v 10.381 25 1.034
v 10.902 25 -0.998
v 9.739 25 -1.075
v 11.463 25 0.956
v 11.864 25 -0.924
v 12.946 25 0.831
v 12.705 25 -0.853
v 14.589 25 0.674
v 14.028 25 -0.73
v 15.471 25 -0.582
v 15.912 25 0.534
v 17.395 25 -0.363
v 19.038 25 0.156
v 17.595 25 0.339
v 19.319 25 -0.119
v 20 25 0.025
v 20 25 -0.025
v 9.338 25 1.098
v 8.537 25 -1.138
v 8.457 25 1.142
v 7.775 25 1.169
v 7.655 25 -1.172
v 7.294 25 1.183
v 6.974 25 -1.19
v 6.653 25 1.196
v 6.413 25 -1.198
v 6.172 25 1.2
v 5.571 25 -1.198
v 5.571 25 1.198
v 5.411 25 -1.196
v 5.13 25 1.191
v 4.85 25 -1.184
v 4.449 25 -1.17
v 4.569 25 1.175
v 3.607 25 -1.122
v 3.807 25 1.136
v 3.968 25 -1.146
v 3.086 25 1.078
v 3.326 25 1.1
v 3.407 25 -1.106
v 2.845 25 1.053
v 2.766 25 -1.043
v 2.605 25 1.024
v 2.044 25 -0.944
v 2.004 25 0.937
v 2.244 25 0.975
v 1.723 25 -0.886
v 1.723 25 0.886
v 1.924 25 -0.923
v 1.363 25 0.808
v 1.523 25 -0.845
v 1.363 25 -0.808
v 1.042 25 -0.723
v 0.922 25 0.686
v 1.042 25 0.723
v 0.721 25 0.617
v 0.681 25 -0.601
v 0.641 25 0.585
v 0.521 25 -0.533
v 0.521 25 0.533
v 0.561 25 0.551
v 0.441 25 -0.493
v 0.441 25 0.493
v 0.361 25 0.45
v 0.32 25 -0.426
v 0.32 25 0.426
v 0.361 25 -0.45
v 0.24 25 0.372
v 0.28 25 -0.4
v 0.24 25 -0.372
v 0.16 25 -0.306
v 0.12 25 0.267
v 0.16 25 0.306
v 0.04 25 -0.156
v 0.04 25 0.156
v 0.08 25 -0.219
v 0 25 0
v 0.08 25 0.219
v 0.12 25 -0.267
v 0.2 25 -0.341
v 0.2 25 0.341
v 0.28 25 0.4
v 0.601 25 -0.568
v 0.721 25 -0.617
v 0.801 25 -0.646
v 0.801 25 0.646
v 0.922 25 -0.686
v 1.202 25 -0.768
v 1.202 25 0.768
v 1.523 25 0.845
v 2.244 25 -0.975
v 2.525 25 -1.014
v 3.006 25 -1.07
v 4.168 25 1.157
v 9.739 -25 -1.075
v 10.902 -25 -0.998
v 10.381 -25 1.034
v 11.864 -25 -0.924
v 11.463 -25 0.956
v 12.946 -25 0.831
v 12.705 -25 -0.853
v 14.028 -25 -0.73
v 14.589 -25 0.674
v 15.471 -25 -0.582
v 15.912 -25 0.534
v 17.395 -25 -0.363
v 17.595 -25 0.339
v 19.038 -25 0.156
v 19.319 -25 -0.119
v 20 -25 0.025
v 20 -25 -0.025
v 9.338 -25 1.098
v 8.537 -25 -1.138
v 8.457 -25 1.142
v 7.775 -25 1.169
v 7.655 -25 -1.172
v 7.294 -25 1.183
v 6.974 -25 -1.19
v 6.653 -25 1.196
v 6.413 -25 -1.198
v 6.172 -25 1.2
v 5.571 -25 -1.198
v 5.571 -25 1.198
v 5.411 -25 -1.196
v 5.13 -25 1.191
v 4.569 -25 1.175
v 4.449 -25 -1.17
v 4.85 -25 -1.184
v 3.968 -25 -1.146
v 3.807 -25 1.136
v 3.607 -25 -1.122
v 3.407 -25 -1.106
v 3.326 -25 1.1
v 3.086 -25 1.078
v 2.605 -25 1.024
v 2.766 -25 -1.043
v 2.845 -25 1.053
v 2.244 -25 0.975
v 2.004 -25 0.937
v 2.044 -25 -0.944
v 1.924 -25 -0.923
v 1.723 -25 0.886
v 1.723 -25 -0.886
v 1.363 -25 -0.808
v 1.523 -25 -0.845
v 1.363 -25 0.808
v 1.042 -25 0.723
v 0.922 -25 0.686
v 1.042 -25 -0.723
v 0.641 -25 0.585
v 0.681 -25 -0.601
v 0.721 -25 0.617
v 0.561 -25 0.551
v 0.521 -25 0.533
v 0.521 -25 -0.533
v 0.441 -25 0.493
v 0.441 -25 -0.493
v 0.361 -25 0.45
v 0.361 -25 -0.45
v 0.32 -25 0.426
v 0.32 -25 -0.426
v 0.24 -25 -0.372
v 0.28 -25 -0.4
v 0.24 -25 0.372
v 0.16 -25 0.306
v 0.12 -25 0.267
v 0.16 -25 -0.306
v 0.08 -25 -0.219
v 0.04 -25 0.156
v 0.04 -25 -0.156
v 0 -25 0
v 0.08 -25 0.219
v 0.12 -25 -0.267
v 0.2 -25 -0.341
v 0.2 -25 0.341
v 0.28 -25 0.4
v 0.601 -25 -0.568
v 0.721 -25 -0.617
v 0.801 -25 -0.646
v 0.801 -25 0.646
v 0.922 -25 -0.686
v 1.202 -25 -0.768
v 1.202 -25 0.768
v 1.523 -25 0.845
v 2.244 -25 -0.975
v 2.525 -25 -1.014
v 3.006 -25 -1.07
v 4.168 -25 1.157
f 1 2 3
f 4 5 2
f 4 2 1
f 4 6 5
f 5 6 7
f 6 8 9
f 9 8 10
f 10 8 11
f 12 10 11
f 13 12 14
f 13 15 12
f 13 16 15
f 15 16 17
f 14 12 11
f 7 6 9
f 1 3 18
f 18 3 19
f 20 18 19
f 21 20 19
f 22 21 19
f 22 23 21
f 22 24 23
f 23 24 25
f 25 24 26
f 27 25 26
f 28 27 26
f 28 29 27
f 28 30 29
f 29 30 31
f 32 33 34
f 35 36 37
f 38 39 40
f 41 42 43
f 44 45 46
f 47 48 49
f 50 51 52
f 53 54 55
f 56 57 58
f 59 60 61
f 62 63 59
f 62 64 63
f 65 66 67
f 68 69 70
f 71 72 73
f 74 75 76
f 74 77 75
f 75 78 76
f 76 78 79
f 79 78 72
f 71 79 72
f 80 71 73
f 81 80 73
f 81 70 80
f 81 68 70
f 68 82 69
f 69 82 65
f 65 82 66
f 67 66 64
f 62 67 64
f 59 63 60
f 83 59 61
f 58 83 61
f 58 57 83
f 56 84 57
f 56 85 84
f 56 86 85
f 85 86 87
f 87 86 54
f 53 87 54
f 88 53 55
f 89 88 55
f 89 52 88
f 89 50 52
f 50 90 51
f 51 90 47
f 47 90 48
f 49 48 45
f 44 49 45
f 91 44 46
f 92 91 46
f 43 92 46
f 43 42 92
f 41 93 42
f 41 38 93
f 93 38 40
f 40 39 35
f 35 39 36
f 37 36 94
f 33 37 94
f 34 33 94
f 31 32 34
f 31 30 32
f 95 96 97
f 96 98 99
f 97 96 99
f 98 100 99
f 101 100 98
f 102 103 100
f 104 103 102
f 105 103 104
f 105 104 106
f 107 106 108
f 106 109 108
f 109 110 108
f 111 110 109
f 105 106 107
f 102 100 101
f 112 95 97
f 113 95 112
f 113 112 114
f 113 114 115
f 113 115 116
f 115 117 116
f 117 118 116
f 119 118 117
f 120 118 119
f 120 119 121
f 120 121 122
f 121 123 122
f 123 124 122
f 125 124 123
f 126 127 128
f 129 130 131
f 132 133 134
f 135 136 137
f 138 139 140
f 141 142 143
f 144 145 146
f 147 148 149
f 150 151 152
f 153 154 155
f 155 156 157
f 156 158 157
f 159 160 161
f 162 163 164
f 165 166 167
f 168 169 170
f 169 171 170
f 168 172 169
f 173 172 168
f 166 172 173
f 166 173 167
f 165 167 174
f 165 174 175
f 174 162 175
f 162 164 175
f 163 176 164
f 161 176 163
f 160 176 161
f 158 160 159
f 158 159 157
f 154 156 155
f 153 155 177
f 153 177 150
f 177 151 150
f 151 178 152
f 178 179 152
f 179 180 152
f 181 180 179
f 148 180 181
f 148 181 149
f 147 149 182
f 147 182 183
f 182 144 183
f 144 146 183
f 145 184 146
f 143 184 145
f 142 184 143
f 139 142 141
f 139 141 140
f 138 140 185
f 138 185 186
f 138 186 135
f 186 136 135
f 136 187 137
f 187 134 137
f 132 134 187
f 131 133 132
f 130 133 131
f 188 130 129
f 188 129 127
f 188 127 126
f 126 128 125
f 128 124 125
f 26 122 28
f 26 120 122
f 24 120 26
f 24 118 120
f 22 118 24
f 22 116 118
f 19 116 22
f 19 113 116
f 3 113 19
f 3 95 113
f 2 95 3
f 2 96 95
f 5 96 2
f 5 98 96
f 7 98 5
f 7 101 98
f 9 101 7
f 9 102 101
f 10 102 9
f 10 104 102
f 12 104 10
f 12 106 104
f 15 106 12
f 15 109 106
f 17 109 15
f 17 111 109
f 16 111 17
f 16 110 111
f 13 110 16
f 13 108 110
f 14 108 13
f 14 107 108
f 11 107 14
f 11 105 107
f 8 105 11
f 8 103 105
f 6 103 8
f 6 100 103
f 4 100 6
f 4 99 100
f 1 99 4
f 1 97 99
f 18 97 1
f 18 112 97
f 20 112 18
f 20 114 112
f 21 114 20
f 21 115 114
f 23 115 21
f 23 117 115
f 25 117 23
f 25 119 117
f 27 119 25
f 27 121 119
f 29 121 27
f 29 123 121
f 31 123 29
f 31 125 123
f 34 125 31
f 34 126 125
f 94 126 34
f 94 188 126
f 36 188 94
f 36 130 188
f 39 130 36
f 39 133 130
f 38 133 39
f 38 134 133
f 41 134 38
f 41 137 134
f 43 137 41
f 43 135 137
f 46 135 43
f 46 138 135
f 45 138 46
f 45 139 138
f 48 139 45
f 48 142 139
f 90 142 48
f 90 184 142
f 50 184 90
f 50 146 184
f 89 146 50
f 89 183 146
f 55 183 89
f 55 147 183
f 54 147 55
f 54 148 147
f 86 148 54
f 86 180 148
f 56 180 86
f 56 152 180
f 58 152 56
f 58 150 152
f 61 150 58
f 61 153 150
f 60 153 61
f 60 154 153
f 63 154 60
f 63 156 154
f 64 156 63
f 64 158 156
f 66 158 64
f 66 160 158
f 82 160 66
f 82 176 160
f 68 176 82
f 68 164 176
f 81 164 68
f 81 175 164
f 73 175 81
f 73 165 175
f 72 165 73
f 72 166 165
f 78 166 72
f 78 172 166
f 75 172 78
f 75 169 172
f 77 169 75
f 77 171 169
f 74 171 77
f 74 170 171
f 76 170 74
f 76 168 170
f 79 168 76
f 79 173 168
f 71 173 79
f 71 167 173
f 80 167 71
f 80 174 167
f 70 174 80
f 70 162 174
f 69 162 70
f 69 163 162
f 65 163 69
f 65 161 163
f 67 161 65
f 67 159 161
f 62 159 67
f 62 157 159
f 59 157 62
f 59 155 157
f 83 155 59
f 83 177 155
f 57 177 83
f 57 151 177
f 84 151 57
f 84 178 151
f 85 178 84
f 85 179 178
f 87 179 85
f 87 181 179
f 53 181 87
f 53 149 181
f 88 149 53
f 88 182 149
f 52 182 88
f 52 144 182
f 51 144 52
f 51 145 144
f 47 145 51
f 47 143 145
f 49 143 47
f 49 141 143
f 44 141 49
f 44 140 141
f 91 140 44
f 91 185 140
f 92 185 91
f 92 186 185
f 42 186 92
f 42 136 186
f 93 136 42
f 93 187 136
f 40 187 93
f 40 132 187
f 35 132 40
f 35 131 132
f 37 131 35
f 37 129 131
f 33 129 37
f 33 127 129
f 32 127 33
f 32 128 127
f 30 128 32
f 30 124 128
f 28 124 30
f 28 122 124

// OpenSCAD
function naca_half_thickness(x,t) = 5*t*(0.2969*sqrt(x) - 0.1260*x - 0.3516*pow(x,2) + 0.2843*pow(x,3) - 0.1015*pow(x,4));
function naca_top_coordinates(t,n) = [ for (x=[0:1/(n-1):1]) [x, naca_half_thickness(x,t)]];
function naca_bottom_coordinates(t,n) = [ for (x=[1:-1/(n-1):0]) [x, - naca_half_thickness(x,t)]];
function naca_coordinates(t,n) = concat(naca_top_coordinates(t,n), naca_bottom_coordinates(t,n));
module naca_airfoil(chord,t,n) {
    points = naca_coordinates(t,n);
    scale([chord,chord,1])polygon(points);
}
module naca_wing(span,chord,t,n,center=false) {
    linear_extrude(height=span,center=center) {
        naca_airfoil(chord,t,n);
    }
}

rotate([90,0,0])naca_wing(span=50,chord=20,t=0.12,n=500,center=true);
